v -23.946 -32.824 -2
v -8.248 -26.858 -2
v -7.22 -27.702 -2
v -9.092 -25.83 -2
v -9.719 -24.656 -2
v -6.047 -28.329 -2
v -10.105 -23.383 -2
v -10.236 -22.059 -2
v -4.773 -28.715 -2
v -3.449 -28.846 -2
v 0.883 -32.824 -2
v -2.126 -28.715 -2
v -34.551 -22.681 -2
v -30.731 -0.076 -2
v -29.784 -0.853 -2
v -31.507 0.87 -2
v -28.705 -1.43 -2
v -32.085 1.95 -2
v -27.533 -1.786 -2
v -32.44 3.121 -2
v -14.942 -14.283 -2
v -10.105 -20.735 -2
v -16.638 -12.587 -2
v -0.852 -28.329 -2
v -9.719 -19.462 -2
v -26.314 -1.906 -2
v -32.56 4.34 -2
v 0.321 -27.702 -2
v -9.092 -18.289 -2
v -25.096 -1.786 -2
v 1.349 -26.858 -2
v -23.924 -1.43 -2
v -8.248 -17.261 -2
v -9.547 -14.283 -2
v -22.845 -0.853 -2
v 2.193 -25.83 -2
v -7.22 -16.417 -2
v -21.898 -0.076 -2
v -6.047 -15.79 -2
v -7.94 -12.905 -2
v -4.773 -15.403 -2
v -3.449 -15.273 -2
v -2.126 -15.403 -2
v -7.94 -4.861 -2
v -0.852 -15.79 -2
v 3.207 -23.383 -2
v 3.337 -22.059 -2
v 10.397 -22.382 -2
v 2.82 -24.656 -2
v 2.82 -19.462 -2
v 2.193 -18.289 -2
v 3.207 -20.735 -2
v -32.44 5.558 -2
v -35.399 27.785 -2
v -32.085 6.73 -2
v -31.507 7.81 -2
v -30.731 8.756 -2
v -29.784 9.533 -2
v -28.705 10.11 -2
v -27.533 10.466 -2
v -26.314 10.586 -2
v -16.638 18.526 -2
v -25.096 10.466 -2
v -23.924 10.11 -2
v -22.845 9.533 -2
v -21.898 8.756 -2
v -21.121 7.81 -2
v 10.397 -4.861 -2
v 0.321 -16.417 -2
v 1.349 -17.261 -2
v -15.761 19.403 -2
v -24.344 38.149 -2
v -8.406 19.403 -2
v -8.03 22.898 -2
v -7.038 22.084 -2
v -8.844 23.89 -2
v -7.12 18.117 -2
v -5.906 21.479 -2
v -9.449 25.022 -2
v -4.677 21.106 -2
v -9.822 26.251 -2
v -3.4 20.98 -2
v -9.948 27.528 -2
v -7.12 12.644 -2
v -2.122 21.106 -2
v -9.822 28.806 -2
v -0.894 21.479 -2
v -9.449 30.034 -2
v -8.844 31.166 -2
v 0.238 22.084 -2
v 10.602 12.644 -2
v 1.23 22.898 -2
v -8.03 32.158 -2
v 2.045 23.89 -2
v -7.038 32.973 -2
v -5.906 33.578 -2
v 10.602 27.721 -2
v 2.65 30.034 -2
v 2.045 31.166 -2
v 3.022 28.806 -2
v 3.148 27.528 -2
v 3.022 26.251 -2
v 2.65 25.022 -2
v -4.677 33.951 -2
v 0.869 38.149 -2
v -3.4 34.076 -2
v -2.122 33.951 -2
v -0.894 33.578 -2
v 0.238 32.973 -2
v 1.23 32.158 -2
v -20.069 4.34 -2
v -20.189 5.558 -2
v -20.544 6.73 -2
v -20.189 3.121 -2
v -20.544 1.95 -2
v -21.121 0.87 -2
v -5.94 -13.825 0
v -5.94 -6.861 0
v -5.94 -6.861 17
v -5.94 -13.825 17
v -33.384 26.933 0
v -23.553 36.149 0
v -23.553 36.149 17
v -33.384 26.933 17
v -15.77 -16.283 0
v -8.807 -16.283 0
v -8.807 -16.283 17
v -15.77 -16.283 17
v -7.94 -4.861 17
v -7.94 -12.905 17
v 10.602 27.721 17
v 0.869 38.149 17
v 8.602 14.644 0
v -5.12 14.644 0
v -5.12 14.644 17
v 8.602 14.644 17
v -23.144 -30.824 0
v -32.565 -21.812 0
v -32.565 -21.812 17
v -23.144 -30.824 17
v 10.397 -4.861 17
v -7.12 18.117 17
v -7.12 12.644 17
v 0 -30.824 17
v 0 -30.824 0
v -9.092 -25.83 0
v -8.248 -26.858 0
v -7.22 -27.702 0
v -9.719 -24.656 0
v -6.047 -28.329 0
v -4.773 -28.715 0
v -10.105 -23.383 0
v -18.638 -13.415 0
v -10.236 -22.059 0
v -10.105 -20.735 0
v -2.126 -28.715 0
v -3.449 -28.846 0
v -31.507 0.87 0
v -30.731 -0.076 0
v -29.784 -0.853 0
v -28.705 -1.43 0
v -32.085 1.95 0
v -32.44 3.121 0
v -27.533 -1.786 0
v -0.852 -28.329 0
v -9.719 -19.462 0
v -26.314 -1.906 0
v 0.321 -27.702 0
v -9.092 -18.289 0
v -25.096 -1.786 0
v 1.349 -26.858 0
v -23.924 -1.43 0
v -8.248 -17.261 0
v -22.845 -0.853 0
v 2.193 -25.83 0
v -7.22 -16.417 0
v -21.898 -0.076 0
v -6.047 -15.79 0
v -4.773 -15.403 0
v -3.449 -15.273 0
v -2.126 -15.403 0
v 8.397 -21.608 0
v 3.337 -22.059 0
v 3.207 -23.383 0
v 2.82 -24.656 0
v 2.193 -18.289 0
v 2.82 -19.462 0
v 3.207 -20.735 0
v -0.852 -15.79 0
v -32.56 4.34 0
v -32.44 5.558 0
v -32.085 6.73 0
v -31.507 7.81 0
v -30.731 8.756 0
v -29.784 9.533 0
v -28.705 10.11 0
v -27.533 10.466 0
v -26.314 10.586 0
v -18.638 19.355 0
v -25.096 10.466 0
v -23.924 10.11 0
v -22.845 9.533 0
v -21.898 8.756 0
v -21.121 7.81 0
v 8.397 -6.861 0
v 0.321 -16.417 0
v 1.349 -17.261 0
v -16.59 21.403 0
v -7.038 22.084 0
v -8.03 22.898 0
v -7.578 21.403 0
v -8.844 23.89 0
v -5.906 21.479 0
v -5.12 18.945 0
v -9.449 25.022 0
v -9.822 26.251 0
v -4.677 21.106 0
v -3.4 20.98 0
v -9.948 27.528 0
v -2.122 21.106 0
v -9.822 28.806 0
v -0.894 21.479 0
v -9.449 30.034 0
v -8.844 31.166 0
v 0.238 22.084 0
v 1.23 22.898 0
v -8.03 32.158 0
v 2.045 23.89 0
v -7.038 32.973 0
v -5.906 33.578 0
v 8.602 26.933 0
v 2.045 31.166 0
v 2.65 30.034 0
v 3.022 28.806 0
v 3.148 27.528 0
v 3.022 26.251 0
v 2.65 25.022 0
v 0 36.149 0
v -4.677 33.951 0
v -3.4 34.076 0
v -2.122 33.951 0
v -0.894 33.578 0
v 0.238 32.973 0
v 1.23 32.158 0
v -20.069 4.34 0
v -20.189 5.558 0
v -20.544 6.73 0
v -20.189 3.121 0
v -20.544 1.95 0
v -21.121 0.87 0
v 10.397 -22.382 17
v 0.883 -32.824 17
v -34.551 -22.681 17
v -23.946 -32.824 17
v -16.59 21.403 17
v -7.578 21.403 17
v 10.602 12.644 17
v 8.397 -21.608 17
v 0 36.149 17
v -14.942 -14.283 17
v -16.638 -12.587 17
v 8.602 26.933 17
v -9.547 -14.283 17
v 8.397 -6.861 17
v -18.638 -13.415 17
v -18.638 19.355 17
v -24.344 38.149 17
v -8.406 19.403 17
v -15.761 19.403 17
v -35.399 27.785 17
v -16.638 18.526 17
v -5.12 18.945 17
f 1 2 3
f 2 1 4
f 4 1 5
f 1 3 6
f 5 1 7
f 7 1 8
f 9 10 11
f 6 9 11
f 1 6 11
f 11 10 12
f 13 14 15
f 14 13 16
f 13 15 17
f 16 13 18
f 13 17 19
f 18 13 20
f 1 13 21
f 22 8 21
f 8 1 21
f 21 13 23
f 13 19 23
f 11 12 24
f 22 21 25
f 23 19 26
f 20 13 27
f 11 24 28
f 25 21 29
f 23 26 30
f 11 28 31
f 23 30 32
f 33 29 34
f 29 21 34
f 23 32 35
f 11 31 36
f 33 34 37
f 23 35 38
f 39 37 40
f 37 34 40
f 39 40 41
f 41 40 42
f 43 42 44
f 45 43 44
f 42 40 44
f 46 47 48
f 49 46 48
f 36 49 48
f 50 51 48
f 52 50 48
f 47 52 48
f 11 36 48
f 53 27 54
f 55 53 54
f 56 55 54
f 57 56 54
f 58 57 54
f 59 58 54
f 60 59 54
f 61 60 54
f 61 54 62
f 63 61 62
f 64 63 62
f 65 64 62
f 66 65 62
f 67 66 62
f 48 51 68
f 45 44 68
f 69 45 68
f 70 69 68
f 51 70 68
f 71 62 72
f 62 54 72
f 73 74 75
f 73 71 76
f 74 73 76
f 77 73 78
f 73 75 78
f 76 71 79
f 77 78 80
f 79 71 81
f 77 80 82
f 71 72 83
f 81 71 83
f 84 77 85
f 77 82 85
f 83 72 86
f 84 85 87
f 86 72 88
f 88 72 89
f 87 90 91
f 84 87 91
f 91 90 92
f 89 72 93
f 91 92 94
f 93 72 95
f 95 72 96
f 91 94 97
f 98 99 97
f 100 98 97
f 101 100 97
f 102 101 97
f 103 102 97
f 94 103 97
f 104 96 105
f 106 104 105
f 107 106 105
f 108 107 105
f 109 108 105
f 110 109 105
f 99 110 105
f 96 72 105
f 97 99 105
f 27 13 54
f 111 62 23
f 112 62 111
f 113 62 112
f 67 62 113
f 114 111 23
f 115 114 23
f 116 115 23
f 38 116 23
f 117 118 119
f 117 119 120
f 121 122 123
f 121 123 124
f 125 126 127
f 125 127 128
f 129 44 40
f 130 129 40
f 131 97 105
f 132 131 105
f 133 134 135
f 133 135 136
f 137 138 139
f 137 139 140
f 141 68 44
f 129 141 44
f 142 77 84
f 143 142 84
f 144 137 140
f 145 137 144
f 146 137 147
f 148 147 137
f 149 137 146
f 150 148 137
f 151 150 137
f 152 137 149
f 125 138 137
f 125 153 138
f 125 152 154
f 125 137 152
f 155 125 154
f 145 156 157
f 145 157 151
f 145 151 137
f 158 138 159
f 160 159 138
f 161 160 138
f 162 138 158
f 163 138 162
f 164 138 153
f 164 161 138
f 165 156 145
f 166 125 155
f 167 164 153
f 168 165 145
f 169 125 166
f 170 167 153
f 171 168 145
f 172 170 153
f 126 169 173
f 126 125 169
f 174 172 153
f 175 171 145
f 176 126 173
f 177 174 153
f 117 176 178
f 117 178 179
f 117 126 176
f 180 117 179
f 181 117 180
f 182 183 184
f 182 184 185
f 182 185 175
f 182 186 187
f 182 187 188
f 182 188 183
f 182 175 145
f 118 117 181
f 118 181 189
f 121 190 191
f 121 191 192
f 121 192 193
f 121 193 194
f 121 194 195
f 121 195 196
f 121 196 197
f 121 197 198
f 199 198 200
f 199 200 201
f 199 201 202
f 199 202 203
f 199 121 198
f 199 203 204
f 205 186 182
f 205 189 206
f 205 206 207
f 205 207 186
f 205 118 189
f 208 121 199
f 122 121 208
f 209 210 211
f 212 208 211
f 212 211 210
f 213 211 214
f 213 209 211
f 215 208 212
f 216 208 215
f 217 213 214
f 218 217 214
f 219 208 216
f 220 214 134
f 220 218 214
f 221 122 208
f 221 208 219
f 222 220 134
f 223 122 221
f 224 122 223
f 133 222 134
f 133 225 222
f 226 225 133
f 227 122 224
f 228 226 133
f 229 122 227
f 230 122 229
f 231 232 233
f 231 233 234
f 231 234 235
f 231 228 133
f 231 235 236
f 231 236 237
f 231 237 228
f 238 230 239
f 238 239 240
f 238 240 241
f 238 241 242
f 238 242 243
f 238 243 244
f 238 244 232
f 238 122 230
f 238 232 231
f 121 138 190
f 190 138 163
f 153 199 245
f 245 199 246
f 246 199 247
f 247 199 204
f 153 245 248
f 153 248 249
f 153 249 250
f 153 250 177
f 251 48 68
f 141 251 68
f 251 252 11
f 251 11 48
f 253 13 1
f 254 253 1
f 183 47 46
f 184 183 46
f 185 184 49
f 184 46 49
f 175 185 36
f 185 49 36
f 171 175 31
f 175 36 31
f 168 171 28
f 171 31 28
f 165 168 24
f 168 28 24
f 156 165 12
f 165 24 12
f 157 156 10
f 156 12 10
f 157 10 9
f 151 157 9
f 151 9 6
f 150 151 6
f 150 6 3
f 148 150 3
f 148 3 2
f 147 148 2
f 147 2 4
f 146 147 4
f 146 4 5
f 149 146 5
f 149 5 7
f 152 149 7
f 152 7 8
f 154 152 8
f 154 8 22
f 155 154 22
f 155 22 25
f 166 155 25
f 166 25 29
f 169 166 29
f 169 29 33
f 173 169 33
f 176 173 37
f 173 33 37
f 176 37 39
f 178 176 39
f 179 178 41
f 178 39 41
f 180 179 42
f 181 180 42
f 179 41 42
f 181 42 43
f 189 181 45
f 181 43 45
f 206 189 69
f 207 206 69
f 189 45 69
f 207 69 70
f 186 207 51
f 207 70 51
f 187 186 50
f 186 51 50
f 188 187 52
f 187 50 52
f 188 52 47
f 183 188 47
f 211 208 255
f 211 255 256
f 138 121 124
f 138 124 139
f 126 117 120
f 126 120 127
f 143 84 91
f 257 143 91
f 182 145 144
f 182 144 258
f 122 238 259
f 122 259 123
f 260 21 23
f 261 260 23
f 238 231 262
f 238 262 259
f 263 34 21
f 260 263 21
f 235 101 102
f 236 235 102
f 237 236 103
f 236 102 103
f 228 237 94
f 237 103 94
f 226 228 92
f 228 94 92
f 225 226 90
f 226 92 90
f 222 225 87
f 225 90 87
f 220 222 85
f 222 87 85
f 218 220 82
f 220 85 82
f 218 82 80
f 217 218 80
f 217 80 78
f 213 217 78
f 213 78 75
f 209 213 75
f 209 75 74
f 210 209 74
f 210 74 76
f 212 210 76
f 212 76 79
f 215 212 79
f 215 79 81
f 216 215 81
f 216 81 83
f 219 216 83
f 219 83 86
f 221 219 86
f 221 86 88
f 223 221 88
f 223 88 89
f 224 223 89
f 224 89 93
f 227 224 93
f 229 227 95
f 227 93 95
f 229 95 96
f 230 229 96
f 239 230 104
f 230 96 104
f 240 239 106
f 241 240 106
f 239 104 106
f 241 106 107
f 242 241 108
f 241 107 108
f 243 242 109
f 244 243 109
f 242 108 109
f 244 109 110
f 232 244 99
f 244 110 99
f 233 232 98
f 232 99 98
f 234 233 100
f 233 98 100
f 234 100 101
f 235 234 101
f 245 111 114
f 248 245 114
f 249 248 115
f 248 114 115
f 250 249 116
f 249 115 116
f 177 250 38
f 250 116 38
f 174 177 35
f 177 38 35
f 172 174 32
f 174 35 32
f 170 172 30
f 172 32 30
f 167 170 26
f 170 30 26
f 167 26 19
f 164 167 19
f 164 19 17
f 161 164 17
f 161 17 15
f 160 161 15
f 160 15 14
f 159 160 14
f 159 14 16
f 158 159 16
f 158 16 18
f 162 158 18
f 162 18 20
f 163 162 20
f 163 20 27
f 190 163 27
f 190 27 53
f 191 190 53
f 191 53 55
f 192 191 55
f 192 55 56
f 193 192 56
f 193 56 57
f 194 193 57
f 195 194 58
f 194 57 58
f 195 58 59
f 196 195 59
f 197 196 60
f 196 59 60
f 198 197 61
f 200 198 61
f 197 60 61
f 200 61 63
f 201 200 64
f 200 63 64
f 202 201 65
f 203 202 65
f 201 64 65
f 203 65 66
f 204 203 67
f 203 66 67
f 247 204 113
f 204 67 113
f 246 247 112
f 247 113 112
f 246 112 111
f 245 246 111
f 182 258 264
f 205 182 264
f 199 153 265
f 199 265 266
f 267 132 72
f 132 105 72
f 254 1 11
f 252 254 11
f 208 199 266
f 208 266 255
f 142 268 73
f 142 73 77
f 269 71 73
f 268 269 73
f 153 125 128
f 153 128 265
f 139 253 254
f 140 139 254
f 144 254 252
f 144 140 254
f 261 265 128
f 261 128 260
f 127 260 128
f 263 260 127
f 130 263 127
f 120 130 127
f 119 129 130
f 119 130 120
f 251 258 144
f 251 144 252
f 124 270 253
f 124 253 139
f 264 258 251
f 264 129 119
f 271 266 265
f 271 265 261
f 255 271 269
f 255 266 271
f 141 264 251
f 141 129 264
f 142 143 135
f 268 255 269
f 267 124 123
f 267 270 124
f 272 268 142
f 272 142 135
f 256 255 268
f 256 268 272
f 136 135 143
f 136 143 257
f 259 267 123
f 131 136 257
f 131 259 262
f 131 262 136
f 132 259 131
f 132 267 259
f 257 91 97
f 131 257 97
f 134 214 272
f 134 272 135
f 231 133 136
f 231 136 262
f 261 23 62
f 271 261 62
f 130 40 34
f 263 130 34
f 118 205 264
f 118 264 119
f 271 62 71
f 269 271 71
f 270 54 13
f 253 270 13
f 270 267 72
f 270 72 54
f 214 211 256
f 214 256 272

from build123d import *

# Parameters (mm, degrees)
F1_DEPTH = 17
F2_T     = 2
F3_R     = 6.5480863362
F3_R_2   = 6.2456314412
F3_R_3   = 6.7864098422
F4_DEPTH = 30


with BuildPart() as f1:
    # F0 (on Top) → F1 (new body)
    with BuildSketch(Plane.XY):
        Polygon((-23.5533174127, 36.1492224038), (-33.3842672408, 26.9327051938), (-32.5650200248, -21.8124184757), (-23.1436938047, -30.8241229504), (0, -30.8241229504), (8.397269994, -21.6076094657), (8.397269994, -6.8611833267), (-5.9395320714, -6.8611833267), (-5.9395320714, -13.824773021), (-8.8068926707, -16.2825100124), (-15.7704818994, -16.2825100124), (-18.6378415674, -13.4151503444), (-18.6378415674, 19.3546824157), (-16.5897272527, 21.4027967304), (-7.5780232437, 21.4027967304), (-5.1202862523, 18.9450588077), (-5.1202862523, 14.6440193057), (8.6020808667, 14.6440193057), (8.6020808667, 26.9327051938), (0, 36.1492224038), align=None)
    extrude(amount=F1_DEPTH)

    # F2
    f2_openings = [f1.faces().sort_by_distance(p)[0] for p in [
        (-27.928164, 30.964293, 17),
    ]]
    offset(amount=F2_T, openings=f2_openings, kind=Kind.INTERSECTION)

    # F3 (on face) → F4 (cut)
    with BuildSketch(Plane(origin=(0, 0, -2), x_dir=(1, 0, 0), z_dir=(0, 0, -1))):
        with Locations((-3.3998074941, -27.5282841176)):
            Circle(F3_R)
        with Locations((-26.31444484, -4.339881707)):
            Circle(F3_R_2)
        with Locations((-3.4494721331, 22.0593828708)):
            Circle(F3_R_3)
    extrude(amount=-F4_DEPTH, mode=Mode.SUBTRACT)


solid = f1.part
